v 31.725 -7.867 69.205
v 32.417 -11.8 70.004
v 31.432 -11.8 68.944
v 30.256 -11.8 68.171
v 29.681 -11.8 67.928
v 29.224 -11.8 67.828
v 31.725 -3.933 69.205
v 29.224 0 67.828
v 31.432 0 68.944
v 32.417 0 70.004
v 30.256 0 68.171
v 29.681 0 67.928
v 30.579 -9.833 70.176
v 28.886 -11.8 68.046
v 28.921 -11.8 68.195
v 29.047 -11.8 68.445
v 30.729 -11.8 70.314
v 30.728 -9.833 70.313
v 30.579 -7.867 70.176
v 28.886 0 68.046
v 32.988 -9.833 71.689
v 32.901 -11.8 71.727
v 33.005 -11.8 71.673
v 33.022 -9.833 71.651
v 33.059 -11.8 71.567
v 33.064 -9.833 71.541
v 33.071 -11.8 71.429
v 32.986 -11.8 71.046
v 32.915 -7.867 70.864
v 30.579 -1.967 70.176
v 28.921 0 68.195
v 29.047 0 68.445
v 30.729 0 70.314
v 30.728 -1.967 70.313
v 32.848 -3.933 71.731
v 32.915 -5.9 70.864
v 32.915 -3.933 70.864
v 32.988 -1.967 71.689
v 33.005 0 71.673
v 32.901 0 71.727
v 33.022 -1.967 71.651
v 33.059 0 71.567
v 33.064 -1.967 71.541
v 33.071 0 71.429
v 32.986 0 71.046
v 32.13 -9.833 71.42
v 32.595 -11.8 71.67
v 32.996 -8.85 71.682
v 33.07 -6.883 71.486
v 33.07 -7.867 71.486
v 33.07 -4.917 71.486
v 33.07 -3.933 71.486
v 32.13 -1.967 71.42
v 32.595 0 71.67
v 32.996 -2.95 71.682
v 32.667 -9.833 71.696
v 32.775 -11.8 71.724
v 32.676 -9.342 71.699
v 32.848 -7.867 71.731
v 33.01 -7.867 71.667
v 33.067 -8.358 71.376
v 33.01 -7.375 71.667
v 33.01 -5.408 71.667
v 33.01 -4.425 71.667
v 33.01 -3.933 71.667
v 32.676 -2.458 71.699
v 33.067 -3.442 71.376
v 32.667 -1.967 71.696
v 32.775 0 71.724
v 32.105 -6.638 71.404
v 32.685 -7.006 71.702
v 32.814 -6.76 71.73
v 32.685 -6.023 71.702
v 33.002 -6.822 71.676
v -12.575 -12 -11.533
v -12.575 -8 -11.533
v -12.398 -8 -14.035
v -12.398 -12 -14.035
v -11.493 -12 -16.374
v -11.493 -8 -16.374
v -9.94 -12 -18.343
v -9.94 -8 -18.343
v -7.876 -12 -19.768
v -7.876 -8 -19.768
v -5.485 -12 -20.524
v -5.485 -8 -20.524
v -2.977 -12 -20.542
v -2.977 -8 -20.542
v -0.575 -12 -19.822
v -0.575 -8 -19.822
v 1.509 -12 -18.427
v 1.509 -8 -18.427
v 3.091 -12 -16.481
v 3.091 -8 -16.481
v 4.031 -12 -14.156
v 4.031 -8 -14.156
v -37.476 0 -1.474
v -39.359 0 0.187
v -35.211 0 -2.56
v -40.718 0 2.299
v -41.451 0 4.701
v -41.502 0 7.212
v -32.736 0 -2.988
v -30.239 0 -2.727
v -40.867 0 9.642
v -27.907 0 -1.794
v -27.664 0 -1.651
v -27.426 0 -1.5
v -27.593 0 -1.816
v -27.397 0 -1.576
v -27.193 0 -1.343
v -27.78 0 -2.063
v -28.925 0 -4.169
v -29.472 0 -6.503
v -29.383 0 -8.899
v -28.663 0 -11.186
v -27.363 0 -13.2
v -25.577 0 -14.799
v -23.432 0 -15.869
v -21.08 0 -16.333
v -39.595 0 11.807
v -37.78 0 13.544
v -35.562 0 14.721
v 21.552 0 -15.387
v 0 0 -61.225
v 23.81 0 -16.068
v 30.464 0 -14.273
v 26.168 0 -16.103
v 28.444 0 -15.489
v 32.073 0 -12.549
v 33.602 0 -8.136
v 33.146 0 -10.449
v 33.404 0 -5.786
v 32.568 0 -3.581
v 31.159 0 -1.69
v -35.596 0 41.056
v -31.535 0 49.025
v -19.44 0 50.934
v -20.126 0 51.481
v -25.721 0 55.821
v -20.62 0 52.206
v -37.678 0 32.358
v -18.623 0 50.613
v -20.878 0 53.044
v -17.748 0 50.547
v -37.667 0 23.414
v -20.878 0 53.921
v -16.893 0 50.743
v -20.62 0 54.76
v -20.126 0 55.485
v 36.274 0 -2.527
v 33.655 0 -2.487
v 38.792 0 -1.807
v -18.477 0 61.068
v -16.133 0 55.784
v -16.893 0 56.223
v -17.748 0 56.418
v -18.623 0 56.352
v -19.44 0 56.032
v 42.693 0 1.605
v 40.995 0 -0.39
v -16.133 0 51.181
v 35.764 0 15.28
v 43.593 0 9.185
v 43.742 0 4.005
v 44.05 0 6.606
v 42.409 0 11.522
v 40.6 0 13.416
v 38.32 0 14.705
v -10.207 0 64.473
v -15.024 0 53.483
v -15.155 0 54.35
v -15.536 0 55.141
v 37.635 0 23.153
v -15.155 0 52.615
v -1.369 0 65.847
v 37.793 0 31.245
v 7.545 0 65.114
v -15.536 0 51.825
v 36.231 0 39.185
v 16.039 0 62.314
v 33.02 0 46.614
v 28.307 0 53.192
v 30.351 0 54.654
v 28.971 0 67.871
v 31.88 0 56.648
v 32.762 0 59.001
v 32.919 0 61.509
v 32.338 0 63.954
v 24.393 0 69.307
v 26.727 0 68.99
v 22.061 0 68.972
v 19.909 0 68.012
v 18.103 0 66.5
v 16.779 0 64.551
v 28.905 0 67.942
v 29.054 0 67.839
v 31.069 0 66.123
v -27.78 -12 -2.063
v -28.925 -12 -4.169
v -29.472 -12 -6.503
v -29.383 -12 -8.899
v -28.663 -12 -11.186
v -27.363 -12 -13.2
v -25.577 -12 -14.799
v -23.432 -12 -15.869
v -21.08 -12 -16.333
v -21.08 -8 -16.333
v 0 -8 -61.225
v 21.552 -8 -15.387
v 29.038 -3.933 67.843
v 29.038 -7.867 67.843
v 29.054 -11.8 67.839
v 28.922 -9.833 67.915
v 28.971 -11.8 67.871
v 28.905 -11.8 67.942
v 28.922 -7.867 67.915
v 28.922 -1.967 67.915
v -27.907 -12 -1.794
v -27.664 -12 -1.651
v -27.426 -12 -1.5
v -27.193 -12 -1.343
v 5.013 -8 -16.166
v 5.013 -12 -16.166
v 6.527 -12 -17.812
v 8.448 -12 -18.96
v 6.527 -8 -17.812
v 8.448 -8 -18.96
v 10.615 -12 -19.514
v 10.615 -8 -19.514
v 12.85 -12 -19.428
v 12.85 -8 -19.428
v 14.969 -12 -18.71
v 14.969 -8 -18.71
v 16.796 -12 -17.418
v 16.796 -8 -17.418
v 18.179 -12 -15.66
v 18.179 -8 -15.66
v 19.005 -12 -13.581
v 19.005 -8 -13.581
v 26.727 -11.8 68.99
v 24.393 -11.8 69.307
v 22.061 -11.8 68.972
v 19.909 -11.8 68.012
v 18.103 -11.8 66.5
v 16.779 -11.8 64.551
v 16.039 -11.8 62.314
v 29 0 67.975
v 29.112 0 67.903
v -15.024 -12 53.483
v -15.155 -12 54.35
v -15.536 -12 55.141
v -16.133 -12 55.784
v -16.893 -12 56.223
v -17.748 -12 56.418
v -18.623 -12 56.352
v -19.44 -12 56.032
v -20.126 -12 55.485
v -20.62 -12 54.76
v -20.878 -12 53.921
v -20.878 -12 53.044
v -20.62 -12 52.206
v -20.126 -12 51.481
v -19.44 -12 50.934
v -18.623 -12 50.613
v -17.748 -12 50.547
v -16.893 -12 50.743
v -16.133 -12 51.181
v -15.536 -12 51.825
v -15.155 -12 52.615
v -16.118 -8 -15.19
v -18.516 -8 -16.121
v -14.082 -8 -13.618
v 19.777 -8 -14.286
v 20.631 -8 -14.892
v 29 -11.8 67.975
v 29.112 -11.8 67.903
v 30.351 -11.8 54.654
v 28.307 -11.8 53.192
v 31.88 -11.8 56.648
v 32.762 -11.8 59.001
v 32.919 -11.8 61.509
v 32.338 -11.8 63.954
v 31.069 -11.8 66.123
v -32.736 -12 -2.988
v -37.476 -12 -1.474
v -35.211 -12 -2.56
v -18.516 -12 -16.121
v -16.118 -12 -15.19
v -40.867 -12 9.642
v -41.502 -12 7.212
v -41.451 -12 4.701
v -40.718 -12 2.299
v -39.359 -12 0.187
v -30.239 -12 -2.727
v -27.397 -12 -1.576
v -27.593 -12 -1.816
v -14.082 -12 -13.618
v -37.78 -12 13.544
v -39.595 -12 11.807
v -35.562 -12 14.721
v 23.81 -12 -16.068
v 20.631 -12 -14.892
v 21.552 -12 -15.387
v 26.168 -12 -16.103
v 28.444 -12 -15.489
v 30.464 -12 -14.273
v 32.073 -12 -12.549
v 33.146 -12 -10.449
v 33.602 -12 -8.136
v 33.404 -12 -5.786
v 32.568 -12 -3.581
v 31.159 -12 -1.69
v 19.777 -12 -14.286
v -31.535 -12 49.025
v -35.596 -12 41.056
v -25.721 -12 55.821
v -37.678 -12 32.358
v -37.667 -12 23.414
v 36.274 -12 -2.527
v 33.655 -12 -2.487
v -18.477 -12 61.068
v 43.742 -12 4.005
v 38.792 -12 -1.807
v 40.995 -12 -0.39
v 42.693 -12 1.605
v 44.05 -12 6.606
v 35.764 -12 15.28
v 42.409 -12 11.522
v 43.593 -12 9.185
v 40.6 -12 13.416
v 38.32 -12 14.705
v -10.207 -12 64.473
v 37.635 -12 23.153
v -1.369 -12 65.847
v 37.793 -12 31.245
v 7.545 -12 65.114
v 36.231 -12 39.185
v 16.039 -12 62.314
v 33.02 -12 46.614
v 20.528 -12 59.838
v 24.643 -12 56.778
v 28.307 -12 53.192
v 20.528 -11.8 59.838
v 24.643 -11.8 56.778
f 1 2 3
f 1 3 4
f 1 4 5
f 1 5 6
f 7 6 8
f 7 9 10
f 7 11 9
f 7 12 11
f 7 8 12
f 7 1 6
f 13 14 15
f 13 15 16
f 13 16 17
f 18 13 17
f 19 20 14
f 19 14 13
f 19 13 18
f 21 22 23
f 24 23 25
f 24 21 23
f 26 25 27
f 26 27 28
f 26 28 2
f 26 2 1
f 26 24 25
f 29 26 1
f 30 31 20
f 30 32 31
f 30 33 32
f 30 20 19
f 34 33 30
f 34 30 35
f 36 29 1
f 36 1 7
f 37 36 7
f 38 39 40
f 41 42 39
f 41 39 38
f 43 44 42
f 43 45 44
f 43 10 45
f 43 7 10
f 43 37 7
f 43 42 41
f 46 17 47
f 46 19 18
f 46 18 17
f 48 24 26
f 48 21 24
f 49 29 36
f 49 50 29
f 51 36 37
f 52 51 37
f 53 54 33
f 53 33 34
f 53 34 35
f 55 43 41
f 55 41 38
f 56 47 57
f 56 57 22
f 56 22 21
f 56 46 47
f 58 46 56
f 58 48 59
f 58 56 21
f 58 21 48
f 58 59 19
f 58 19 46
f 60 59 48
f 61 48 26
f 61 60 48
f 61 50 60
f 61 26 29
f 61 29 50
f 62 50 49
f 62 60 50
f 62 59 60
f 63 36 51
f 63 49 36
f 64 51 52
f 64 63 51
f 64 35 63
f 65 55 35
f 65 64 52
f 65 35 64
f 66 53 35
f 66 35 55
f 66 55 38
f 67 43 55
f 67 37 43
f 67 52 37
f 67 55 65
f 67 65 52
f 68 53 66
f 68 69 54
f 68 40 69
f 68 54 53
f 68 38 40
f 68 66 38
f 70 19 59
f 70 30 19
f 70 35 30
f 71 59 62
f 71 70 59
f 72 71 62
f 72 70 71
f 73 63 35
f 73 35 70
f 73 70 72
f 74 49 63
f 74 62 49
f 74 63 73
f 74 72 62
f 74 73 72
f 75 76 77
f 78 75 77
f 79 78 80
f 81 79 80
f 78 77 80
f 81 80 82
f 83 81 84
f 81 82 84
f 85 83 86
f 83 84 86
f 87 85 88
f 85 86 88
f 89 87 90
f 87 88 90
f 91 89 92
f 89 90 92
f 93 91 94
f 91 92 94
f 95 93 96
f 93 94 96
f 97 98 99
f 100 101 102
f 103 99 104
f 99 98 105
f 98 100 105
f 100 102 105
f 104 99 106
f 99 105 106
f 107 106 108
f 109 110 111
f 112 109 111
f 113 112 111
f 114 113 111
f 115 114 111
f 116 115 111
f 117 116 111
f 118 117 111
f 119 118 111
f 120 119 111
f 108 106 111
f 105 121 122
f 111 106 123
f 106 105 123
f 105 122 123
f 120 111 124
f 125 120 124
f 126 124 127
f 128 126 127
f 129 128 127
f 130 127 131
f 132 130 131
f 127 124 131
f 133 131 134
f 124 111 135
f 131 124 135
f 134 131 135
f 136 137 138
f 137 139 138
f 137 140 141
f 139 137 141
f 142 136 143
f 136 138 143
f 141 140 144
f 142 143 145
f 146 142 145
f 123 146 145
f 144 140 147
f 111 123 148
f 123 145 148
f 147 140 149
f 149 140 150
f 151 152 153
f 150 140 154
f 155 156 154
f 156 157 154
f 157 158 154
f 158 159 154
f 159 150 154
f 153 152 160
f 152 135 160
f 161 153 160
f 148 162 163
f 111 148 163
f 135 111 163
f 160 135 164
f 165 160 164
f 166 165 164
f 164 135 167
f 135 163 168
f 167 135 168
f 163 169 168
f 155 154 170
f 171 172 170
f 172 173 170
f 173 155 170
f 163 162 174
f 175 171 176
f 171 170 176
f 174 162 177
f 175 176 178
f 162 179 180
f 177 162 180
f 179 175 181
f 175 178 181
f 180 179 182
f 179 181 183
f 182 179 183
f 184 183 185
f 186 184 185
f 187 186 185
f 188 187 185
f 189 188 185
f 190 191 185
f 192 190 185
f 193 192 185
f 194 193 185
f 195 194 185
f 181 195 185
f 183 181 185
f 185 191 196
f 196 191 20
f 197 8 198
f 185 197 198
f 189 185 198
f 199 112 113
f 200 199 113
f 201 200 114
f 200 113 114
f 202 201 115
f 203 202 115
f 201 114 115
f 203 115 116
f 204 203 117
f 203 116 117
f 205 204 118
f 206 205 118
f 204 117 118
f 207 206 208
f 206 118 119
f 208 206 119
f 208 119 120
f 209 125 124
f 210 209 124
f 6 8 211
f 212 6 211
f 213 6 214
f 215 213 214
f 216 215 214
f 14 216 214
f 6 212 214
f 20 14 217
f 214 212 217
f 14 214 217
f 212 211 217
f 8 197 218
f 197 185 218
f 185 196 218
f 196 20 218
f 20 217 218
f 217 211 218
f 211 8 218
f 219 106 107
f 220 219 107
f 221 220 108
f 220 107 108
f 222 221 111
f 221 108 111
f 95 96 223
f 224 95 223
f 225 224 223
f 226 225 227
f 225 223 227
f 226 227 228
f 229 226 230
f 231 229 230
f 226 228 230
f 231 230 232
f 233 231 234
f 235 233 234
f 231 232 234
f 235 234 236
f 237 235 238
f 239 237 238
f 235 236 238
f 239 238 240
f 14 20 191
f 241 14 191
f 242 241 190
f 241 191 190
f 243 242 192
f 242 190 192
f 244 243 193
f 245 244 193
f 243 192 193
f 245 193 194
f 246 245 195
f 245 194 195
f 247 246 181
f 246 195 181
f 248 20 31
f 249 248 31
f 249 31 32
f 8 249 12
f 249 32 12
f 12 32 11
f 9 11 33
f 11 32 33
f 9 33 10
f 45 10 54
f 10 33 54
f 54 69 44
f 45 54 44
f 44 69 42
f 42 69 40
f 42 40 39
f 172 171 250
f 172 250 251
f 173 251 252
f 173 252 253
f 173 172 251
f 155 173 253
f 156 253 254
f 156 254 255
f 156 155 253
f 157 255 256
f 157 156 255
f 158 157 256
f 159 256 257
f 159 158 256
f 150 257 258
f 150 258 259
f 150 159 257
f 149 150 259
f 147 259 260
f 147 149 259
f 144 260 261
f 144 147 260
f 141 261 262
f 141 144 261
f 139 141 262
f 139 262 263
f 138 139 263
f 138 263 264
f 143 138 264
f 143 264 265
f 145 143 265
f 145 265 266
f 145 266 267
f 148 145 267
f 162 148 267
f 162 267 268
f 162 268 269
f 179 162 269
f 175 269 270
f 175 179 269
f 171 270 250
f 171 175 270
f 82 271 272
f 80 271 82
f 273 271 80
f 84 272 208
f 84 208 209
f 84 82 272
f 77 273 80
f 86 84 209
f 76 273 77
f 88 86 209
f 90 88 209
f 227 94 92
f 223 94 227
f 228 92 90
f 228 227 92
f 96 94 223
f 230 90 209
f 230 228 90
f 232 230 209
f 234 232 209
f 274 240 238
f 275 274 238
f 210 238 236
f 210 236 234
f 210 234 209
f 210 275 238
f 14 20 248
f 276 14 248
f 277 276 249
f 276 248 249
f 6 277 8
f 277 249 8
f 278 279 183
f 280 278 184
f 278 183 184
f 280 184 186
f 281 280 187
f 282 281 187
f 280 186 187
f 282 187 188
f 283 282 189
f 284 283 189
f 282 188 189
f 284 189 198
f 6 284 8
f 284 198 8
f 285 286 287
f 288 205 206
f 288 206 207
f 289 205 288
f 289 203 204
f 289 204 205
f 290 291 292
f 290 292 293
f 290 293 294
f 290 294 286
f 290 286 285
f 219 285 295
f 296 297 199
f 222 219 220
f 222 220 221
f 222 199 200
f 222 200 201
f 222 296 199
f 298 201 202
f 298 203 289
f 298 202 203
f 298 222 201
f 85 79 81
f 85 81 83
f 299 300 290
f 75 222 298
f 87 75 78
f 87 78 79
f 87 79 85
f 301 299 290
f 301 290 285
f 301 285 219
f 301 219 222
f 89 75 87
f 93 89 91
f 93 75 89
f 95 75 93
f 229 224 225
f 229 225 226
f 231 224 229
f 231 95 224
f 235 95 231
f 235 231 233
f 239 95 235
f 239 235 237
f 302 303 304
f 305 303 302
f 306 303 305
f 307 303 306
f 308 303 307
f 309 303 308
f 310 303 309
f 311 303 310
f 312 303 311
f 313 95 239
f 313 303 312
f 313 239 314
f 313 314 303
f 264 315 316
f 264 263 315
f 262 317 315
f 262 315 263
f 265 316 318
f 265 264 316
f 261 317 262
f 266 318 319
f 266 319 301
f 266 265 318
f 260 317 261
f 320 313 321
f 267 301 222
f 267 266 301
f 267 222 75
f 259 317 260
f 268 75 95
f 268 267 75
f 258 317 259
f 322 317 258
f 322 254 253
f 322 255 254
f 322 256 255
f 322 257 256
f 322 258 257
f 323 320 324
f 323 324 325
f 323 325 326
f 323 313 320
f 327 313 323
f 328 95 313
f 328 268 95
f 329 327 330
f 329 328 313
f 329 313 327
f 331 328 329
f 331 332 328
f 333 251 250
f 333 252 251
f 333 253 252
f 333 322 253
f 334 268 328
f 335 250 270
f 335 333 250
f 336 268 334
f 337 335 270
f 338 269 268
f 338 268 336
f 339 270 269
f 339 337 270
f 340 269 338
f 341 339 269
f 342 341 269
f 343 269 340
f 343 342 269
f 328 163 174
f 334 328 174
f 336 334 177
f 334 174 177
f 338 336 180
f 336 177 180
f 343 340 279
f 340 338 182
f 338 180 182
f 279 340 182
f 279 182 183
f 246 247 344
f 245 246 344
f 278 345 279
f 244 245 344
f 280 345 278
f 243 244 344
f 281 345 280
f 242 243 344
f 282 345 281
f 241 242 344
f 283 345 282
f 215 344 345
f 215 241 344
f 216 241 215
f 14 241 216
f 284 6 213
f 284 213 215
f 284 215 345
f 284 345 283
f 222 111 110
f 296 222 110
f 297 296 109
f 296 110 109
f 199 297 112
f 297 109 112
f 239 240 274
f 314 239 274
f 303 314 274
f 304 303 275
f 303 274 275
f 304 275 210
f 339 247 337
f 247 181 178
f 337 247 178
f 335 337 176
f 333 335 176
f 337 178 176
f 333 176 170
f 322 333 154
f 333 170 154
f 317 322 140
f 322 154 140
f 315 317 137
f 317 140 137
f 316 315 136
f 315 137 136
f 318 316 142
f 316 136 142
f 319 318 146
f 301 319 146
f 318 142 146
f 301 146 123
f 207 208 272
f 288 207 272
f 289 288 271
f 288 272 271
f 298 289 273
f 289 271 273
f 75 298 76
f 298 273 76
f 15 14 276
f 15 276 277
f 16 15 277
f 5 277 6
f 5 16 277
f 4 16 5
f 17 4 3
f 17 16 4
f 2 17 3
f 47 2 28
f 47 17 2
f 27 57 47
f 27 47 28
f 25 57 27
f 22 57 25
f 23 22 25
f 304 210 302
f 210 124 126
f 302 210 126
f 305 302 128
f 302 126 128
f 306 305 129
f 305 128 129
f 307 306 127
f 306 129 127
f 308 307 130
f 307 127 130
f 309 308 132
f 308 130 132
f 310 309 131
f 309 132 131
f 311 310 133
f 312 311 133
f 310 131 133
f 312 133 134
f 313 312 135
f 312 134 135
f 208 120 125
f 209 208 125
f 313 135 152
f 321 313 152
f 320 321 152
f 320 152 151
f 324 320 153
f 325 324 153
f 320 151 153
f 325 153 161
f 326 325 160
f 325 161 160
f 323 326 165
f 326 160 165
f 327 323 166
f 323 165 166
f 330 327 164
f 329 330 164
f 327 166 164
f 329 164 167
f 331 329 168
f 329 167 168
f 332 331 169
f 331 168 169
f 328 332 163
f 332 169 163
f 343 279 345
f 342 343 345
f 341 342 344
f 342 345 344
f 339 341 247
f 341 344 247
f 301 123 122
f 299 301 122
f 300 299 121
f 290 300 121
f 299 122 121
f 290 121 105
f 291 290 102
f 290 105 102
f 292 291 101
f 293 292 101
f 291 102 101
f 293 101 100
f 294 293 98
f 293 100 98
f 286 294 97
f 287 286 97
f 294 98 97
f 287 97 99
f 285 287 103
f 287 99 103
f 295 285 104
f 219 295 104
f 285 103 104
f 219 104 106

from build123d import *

# Parameters (mm, degrees)
F0_R     = 2.9434235735
F1_DEPTH = 12
F2_DEPTH = 8
F3_DEPTH = 11.8
F4_DEPTH = 11.8


with BuildPart() as f1:
    # F0 (on Front) → F1 (new body)
    with BuildSketch(Plane.XZ):
        with BuildLine():
            ThreePointArc((31.1593048641, -1.6902042533), (43.7415417741, 4.0051920343), (35.7643310919, 15.2796913254))
            ThreePointArc((35.7643310919, 15.2796913254), (37.2238986373, 35.2565674313), (28.3067829054, 53.1923128408))
            ThreePointArc((28.3067829054, 53.1923128408), (22.6372348296, 58.3776700022), (16.0391949523, 62.3143658315))
            ThreePointArc((16.0391949523, 62.3143658315), (-25.7208254671, 55.8212382649), (-35.5617688497, 14.7211671656))
            ThreePointArc((-35.5617688497, 14.7211671656), (-40.7180864689, 2.2992303886), (-27.9065539342, -1.7942716323))
            ThreePointArc((-27.9065539342, -1.7942716323), (-27.5446454608, -1.5766701921), (-27.1931813438, -1.342573835))
            ThreePointArc((-27.1931813438, -1.342573835), (-27.4960472706, -1.6953091832), (-27.7802552335, -2.0632437281))
            ThreePointArc((-27.7802552335, -2.0632437281), (-28.6625074121, -11.1856876732), (-21.0796275499, -16.3332390751))
            ThreePointArc((-21.0796275499, -16.3332390751), (-16.1178400261, -15.1902033764), (-12.574737056, -11.5333895472))
            ThreePointArc((-12.574737056, -11.5333895472), (-5.4849315522, -20.5237333781), (4.0305104731, -14.1560032219))
            ThreePointArc((4.0305104731, -14.1560032219), (11.7358749898, -19.5519005786), (19.0047474963, -13.5809841412))
            ThreePointArc((19.0047474963, -13.5809841412), (20.1948345196, -14.6021663277), (21.5522292089, -15.3874050418))
            ThreePointArc((21.5522292089, -15.3874050418), (32.0731520497, -12.5489196499), (31.1593048641, -1.6902042533))
        make_face()
        with Locations((-17.9679151624, 53.4826219082)):
            Circle(F0_R, mode=Mode.SUBTRACT)
    extrude(amount=F1_DEPTH)

    # F0 (on Front) → F2 (join)
    with BuildSketch(Plane.XZ):
        with BuildLine():
            Line((0, -61.2254792136), (21.5522292089, -15.3874050418))
            ThreePointArc((21.5522292089, -15.3874050418), (20.1948345196, -14.6021663277), (19.0047474963, -13.5809841412))
            ThreePointArc((19.0047474963, -13.5809841412), (11.7358749898, -19.5519005786), (4.0305104731, -14.1560032219))
            ThreePointArc((4.0305104731, -14.1560032219), (-5.4849315522, -20.5237333781), (-12.574737056, -11.5333895472))
            ThreePointArc((-12.574737056, -11.5333895472), (-16.1178400261, -15.1902033764), (-21.0796275499, -16.3332390751))
            Line((-21.0796275499, -16.3332390751), (0, -61.2254792136))
        make_face()
    extrude(amount=F2_DEPTH)

    # F0 (on Front) → F3 (join)
    with BuildSketch(Plane.XZ):
        with BuildLine():
            ThreePointArc((16.0391949523, 62.3143658315), (22.6372348296, 58.3776700022), (28.3067829054, 53.1923128408))
            ThreePointArc((28.3067829054, 53.1923128408), (32.9332392438, 60.249167579), (29.2235228949, 67.8281715806))
            add(Edge.make_bspline(
                [(29.2235228949, 67.8281715806), (29.0071843018, 67.815826003), (28.877678793, 67.8830963022), (28.8862232988, 68.0464194359)],
                knots=[0.9141072162, 0.9141072162, 0.9141072162, 0.9141072162, 1, 1, 1, 1], degree=3))
            ThreePointArc((28.8862232988, 68.0464194359), (20.9516313256, 68.5671124151), (16.0391949523, 62.3143658315))
        make_face()
    extrude(amount=F3_DEPTH)


with BuildPart() as f4:
    # F0 (on Front) → F4 (new body)
    with BuildSketch(Plane.XZ):
        with BuildLine():
            ThreePointArc((28.8862232988, 68.0464194359), (29.0561589553, 67.939282788), (29.2235228949, 67.8281715806))
            add(Edge.make_bspline(
                [(28.8862232988, 68.0464194359), (28.9265366205, 68.8169845438), (34.2655144887, 73.8050920902), (32.3697336449, 69.1362739393), (29.7755038445, 67.8596709242), (29.2235228949, 67.8281715806)],
                knots=[0, 0, 0, 0, 0.4052456054, 0.694954546, 0.9141072162, 0.9141072162, 0.9141072162, 0.9141072162], degree=3))
        make_face()
    extrude(amount=F4_DEPTH)


solid = Compound([f1.part, f4.part])
